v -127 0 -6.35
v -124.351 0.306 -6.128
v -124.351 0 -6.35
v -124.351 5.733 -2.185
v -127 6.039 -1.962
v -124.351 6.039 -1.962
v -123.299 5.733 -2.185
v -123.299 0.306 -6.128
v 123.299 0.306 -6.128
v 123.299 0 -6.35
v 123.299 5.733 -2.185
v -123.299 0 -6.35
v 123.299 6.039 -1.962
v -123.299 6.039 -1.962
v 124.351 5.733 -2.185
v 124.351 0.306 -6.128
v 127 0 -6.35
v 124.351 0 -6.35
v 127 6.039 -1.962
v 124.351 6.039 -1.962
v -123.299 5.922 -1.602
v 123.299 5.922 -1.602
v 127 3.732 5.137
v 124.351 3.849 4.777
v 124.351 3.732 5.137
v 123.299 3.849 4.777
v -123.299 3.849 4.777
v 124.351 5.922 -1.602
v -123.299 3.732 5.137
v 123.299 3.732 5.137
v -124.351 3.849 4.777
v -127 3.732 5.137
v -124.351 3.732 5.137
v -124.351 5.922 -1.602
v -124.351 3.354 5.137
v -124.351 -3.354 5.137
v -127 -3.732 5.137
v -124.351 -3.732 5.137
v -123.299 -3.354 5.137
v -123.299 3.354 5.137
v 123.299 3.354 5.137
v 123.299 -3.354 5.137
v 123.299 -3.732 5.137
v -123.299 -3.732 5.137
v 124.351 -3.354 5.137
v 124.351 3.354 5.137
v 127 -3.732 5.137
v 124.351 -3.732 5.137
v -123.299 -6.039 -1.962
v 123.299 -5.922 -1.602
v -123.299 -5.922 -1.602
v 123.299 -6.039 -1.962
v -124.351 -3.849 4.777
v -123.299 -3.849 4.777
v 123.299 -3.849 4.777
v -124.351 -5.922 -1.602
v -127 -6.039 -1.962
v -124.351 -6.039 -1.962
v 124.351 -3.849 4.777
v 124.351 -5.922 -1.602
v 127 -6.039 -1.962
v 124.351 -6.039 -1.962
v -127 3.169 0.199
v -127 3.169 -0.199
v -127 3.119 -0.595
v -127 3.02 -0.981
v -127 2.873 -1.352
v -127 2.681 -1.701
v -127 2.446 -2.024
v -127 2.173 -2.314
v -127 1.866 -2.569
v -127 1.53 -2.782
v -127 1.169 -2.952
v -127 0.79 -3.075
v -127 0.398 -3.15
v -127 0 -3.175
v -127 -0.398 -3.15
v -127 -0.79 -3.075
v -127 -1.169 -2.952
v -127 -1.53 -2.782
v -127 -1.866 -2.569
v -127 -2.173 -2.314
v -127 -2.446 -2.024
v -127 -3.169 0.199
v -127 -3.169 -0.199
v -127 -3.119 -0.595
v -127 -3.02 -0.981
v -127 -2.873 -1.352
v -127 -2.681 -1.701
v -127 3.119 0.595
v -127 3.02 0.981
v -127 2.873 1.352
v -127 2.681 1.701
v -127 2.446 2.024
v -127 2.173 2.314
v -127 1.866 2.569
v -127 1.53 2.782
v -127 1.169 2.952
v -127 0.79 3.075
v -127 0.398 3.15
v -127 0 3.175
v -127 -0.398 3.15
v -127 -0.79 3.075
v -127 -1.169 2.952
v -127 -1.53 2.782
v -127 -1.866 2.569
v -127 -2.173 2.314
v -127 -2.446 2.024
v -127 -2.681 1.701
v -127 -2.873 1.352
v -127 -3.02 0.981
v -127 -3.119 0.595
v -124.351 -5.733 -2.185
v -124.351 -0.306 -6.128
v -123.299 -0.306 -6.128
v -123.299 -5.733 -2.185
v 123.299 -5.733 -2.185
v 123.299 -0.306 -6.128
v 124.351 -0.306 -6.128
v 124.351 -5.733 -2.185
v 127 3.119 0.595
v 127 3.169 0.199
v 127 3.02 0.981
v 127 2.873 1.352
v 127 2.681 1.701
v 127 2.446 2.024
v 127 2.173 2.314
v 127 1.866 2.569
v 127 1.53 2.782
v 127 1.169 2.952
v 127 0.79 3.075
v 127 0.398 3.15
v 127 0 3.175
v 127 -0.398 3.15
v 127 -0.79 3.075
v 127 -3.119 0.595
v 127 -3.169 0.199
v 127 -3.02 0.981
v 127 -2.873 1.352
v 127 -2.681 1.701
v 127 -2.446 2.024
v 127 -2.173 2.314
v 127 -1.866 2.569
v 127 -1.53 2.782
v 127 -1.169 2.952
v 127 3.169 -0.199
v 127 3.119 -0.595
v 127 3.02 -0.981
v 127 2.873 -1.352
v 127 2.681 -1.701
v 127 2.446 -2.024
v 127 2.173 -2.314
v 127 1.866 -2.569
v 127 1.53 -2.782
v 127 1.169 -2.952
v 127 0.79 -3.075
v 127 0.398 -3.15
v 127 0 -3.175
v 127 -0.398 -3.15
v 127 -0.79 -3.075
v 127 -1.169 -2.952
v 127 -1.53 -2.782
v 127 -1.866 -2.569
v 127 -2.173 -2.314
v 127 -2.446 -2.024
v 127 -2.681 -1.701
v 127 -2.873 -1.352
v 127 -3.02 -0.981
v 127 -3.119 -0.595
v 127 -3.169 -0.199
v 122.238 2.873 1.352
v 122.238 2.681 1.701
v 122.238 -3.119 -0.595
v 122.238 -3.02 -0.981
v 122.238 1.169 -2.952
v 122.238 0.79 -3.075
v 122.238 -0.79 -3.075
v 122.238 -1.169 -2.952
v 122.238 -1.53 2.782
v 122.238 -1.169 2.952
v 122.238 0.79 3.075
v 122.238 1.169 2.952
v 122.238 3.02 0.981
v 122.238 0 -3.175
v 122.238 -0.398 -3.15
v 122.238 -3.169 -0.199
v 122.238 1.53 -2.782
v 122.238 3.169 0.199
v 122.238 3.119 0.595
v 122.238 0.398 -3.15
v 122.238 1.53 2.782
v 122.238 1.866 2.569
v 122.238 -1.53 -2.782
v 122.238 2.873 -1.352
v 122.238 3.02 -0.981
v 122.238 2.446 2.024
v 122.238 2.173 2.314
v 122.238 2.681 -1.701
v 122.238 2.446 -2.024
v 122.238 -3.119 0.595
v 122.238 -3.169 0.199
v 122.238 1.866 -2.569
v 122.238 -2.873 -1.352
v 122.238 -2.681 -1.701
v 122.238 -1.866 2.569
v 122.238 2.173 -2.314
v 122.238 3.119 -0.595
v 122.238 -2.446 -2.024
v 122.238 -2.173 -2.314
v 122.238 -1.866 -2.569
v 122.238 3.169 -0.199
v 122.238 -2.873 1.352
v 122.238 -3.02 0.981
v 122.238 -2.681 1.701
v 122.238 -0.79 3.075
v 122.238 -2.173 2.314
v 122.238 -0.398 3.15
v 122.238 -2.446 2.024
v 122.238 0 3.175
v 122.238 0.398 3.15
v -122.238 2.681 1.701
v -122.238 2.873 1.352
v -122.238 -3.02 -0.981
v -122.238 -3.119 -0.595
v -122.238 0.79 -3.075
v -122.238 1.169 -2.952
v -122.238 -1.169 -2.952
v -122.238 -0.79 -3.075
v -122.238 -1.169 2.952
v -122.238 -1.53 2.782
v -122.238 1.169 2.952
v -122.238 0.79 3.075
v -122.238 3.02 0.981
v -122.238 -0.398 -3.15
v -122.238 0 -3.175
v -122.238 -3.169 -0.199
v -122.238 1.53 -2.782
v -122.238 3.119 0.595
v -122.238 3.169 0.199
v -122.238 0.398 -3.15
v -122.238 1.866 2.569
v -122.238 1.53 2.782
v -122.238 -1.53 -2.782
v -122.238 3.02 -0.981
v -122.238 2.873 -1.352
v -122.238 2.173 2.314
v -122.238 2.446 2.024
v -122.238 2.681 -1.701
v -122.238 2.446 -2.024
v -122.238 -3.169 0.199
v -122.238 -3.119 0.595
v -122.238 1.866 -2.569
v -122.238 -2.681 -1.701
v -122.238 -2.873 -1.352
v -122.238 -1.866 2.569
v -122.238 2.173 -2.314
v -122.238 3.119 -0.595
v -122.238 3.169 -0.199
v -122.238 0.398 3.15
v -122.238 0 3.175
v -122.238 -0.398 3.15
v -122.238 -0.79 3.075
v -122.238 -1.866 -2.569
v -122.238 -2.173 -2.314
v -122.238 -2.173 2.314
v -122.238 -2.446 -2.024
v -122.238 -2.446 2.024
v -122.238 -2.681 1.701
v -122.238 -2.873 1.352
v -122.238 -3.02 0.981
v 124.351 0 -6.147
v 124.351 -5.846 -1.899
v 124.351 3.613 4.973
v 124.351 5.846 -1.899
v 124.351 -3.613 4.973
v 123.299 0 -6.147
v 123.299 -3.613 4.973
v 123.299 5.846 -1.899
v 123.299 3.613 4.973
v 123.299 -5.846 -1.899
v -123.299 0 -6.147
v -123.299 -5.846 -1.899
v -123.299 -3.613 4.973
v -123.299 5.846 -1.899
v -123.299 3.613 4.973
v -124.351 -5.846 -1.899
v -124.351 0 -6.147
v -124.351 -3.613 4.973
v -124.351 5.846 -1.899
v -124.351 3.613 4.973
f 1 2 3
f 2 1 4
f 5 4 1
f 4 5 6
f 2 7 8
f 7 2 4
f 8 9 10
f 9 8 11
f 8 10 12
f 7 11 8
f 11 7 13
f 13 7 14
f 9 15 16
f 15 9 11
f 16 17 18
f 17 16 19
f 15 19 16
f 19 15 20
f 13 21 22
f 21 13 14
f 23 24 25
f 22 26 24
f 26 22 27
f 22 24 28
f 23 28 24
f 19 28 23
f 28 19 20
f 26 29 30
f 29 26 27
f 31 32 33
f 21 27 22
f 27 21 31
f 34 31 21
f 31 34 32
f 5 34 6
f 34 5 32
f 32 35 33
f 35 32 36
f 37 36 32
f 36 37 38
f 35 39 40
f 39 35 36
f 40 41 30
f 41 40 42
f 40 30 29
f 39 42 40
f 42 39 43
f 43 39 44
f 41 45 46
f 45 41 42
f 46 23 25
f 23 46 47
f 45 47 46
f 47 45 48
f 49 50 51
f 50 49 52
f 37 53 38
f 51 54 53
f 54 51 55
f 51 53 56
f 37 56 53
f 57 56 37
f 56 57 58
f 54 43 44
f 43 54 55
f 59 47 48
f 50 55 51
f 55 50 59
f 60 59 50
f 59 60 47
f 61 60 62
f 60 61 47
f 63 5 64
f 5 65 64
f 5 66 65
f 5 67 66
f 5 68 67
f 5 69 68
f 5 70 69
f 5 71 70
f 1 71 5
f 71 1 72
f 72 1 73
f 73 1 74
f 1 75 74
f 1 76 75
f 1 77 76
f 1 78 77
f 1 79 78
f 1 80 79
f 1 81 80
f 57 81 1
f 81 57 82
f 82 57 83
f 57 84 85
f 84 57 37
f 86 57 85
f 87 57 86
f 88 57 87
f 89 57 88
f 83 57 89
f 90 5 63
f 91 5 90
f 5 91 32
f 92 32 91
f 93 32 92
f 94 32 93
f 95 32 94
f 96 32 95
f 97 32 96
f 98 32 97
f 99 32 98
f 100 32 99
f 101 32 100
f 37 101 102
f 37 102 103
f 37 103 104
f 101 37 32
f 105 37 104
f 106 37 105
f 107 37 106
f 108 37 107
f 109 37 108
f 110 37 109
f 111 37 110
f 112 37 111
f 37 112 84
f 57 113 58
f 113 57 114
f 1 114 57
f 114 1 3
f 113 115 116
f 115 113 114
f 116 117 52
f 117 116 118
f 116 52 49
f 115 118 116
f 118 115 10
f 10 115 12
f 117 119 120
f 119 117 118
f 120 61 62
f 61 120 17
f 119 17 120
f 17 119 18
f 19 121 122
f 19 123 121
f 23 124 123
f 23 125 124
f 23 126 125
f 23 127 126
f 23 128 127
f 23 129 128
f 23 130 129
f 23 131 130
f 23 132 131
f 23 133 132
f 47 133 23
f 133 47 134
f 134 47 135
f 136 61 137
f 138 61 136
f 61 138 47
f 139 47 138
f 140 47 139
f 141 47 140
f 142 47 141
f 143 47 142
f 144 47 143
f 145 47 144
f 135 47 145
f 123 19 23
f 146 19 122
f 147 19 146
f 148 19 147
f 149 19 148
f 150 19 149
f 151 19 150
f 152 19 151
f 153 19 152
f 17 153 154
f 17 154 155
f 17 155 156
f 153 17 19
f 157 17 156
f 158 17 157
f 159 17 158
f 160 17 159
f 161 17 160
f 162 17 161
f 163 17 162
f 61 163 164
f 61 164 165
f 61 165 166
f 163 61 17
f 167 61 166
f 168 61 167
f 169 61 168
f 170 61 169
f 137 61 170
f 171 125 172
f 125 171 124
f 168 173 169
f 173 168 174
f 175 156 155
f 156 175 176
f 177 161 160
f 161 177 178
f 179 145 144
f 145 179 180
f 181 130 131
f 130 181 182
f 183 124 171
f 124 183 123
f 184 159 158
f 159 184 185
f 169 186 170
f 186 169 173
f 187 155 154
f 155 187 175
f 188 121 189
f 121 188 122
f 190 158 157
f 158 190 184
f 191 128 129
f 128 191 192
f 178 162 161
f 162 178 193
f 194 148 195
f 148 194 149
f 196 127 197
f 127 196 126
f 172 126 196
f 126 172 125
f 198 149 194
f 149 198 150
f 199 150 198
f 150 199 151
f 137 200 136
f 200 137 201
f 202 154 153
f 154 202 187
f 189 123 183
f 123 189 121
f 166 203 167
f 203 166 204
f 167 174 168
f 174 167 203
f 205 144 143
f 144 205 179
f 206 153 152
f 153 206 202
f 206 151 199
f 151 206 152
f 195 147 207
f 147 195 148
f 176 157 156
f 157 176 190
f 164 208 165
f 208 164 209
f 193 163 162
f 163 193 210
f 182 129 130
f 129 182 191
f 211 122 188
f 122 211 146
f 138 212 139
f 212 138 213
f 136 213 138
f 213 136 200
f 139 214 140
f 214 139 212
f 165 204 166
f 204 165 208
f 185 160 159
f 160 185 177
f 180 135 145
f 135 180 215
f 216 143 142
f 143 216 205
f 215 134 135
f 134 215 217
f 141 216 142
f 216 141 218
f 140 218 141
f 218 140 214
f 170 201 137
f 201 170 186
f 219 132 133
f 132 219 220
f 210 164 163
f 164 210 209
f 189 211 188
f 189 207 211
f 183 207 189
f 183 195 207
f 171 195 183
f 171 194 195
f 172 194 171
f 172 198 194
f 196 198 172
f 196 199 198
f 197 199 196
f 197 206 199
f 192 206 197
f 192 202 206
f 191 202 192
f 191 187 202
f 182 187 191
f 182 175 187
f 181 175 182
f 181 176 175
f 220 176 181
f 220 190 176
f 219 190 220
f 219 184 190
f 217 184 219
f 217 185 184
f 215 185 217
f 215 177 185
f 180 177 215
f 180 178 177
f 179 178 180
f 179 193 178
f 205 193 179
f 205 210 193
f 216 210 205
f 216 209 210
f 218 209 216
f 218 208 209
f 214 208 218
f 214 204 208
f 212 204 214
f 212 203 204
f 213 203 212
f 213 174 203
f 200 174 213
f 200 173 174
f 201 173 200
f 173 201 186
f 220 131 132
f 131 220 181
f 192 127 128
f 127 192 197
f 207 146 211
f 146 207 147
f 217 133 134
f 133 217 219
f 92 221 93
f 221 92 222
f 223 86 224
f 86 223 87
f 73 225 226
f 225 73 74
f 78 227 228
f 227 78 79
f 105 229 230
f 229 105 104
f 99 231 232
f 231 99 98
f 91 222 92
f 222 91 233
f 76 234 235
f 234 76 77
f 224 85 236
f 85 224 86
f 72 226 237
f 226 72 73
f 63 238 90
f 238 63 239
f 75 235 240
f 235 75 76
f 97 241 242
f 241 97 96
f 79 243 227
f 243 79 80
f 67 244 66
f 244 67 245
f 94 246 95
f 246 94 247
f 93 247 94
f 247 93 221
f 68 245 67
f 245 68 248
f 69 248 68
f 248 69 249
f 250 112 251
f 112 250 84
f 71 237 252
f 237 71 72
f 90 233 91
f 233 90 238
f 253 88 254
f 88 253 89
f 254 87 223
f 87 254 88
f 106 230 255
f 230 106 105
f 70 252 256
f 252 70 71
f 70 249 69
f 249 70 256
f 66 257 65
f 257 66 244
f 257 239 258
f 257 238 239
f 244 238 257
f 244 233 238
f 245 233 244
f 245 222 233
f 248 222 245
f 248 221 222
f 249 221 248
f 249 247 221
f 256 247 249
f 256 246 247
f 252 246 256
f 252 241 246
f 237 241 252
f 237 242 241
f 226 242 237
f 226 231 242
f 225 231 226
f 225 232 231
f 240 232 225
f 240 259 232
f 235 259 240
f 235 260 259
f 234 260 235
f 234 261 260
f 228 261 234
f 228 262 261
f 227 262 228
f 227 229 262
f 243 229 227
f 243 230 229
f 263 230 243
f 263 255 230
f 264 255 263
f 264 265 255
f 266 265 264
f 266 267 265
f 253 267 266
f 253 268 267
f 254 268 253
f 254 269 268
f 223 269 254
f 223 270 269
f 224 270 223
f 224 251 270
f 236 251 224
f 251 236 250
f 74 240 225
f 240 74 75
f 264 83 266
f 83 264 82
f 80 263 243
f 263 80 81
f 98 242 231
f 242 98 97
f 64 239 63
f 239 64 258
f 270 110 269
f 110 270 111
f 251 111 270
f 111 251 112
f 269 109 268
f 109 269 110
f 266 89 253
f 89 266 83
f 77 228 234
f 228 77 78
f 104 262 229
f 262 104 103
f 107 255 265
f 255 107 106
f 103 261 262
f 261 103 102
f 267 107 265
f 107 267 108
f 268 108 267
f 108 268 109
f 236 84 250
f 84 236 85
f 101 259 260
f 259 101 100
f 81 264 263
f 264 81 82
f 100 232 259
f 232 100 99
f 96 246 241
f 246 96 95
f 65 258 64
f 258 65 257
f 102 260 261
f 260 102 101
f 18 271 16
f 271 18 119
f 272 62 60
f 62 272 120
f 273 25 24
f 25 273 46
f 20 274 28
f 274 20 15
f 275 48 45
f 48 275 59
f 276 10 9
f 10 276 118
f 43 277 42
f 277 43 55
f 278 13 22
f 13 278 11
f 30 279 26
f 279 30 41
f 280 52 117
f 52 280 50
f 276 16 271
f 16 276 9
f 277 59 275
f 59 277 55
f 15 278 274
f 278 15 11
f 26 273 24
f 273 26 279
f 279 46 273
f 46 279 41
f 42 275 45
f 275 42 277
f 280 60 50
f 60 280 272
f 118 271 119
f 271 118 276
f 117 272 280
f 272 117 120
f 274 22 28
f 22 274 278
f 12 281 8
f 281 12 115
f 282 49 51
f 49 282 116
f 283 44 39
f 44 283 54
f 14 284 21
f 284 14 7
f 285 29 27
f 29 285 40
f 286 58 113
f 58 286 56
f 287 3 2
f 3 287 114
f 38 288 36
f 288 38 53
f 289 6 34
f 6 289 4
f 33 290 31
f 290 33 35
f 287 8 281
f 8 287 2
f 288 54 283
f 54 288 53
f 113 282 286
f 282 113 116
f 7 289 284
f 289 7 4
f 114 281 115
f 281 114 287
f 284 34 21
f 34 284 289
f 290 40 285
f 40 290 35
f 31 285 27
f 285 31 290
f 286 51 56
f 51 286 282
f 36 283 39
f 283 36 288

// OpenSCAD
/*[Basic Shaft dimensions]*/

//Type of shaft:
ShaftType = "Hex"; //[Hex, Round]
//Total length of the shaft:
TotalLength = 10;
//The size of the shaft:
ShaftSize = 0.5;

/*[Snap Rings]*/

//Turns snap ring grooves on or off:
Snapring = "On"; //[On, Off]
//Distance between inside edges of both snap rings (Same as total length if you do not want snap rings):
InsideLength = 9.875;


/*[Encoders]*/

//Turns Encoder holes on or off:
EncoderHoles = "On"; //[On, Off]
//Toggle between encoder holes on both sides, or only on one:
BothSides = "On"; //[On, Off]
//Depth of the hole for your encoder:
EncoderHoleDepth = .375;
//Diameter of the shaft of your encoder:
EncoderShaftDiameter = .25;

/*[hidden]*/
GrooveDepth = ShaftSize/31.25;
GrooveWidth = ShaftSize/12.075;
SnapRingOffset = (TotalLength - InsideLength);

module Shaft() {
    if (ShaftType == "Hex") {
            rotate([0, 90, 0]) scale([25.4, 25.4, 25.4])
            cylinder(h=TotalLength, d=ShaftSize, $fa=60, center = true);
        }
    else if (ShaftType == "Round") {
            rotate([0, 90, 0]) scale([25.4, 25.4, 25.4])
            cylinder(h=TotalLength, d=ShaftSize, $fn = 50, center = true);
        }
    }
module EncoderHole() {
    if(EncoderHoles == "On") {
        difference() {
            Shaft();
            rotate([0, 90, 0]) scale([25.4, 25.4, 25.4]) translate([0, 0, TotalLength/2])
                cylinder(h = EncoderHoleDepth, d = EncoderShaftDiameter, $fn = 50, center = true);
            if(BothSides == "On") {
            rotate([0, 90, 0]) scale([25.4, 25.4, 25.4]) translate([0, 0, -TotalLength/2])
                cylinder(h = EncoderHoleDepth, d = EncoderShaftDiameter, $fn = 50, center = true);
        }
        }  
    }
}

module  Grooves(){
    if (Snapring == "On"){
        difference() {
            rotate([0, 90, 0]) scale([25.4, 25.4, 25.4]) translate([0, 0, TotalLength/2-SnapRingOffset])
                cylinder(h = GrooveWidth, d = ShaftSize, $fn = 50, center = true);
            rotate([0, 90, 0]) scale([25.4, 25.4, 25.4]) translate([0, 0, TotalLength/2-SnapRingOffset])
                cylinder(h = GrooveWidth, d = ShaftSize-GrooveDepth, $fn = 50, center = true);
        }
        difference() {
            rotate([0, 90, 0]) scale([25.4, 25.4, 25.4]) translate([0, 0, -TotalLength/2+SnapRingOffset])
                cylinder(h = GrooveWidth, d = ShaftSize, $fn = 50, center = true);            
            rotate([0, 90, 0]) scale([25.4, 25.4, 25.4]) translate([0, 0, -TotalLength/2+SnapRingOffset])
                cylinder(h = GrooveWidth, d = ShaftSize-GrooveDepth, $fn = 50, center = true);
        }
}
}
    difference() {
    EncoderHole();
    Grooves();
        }
